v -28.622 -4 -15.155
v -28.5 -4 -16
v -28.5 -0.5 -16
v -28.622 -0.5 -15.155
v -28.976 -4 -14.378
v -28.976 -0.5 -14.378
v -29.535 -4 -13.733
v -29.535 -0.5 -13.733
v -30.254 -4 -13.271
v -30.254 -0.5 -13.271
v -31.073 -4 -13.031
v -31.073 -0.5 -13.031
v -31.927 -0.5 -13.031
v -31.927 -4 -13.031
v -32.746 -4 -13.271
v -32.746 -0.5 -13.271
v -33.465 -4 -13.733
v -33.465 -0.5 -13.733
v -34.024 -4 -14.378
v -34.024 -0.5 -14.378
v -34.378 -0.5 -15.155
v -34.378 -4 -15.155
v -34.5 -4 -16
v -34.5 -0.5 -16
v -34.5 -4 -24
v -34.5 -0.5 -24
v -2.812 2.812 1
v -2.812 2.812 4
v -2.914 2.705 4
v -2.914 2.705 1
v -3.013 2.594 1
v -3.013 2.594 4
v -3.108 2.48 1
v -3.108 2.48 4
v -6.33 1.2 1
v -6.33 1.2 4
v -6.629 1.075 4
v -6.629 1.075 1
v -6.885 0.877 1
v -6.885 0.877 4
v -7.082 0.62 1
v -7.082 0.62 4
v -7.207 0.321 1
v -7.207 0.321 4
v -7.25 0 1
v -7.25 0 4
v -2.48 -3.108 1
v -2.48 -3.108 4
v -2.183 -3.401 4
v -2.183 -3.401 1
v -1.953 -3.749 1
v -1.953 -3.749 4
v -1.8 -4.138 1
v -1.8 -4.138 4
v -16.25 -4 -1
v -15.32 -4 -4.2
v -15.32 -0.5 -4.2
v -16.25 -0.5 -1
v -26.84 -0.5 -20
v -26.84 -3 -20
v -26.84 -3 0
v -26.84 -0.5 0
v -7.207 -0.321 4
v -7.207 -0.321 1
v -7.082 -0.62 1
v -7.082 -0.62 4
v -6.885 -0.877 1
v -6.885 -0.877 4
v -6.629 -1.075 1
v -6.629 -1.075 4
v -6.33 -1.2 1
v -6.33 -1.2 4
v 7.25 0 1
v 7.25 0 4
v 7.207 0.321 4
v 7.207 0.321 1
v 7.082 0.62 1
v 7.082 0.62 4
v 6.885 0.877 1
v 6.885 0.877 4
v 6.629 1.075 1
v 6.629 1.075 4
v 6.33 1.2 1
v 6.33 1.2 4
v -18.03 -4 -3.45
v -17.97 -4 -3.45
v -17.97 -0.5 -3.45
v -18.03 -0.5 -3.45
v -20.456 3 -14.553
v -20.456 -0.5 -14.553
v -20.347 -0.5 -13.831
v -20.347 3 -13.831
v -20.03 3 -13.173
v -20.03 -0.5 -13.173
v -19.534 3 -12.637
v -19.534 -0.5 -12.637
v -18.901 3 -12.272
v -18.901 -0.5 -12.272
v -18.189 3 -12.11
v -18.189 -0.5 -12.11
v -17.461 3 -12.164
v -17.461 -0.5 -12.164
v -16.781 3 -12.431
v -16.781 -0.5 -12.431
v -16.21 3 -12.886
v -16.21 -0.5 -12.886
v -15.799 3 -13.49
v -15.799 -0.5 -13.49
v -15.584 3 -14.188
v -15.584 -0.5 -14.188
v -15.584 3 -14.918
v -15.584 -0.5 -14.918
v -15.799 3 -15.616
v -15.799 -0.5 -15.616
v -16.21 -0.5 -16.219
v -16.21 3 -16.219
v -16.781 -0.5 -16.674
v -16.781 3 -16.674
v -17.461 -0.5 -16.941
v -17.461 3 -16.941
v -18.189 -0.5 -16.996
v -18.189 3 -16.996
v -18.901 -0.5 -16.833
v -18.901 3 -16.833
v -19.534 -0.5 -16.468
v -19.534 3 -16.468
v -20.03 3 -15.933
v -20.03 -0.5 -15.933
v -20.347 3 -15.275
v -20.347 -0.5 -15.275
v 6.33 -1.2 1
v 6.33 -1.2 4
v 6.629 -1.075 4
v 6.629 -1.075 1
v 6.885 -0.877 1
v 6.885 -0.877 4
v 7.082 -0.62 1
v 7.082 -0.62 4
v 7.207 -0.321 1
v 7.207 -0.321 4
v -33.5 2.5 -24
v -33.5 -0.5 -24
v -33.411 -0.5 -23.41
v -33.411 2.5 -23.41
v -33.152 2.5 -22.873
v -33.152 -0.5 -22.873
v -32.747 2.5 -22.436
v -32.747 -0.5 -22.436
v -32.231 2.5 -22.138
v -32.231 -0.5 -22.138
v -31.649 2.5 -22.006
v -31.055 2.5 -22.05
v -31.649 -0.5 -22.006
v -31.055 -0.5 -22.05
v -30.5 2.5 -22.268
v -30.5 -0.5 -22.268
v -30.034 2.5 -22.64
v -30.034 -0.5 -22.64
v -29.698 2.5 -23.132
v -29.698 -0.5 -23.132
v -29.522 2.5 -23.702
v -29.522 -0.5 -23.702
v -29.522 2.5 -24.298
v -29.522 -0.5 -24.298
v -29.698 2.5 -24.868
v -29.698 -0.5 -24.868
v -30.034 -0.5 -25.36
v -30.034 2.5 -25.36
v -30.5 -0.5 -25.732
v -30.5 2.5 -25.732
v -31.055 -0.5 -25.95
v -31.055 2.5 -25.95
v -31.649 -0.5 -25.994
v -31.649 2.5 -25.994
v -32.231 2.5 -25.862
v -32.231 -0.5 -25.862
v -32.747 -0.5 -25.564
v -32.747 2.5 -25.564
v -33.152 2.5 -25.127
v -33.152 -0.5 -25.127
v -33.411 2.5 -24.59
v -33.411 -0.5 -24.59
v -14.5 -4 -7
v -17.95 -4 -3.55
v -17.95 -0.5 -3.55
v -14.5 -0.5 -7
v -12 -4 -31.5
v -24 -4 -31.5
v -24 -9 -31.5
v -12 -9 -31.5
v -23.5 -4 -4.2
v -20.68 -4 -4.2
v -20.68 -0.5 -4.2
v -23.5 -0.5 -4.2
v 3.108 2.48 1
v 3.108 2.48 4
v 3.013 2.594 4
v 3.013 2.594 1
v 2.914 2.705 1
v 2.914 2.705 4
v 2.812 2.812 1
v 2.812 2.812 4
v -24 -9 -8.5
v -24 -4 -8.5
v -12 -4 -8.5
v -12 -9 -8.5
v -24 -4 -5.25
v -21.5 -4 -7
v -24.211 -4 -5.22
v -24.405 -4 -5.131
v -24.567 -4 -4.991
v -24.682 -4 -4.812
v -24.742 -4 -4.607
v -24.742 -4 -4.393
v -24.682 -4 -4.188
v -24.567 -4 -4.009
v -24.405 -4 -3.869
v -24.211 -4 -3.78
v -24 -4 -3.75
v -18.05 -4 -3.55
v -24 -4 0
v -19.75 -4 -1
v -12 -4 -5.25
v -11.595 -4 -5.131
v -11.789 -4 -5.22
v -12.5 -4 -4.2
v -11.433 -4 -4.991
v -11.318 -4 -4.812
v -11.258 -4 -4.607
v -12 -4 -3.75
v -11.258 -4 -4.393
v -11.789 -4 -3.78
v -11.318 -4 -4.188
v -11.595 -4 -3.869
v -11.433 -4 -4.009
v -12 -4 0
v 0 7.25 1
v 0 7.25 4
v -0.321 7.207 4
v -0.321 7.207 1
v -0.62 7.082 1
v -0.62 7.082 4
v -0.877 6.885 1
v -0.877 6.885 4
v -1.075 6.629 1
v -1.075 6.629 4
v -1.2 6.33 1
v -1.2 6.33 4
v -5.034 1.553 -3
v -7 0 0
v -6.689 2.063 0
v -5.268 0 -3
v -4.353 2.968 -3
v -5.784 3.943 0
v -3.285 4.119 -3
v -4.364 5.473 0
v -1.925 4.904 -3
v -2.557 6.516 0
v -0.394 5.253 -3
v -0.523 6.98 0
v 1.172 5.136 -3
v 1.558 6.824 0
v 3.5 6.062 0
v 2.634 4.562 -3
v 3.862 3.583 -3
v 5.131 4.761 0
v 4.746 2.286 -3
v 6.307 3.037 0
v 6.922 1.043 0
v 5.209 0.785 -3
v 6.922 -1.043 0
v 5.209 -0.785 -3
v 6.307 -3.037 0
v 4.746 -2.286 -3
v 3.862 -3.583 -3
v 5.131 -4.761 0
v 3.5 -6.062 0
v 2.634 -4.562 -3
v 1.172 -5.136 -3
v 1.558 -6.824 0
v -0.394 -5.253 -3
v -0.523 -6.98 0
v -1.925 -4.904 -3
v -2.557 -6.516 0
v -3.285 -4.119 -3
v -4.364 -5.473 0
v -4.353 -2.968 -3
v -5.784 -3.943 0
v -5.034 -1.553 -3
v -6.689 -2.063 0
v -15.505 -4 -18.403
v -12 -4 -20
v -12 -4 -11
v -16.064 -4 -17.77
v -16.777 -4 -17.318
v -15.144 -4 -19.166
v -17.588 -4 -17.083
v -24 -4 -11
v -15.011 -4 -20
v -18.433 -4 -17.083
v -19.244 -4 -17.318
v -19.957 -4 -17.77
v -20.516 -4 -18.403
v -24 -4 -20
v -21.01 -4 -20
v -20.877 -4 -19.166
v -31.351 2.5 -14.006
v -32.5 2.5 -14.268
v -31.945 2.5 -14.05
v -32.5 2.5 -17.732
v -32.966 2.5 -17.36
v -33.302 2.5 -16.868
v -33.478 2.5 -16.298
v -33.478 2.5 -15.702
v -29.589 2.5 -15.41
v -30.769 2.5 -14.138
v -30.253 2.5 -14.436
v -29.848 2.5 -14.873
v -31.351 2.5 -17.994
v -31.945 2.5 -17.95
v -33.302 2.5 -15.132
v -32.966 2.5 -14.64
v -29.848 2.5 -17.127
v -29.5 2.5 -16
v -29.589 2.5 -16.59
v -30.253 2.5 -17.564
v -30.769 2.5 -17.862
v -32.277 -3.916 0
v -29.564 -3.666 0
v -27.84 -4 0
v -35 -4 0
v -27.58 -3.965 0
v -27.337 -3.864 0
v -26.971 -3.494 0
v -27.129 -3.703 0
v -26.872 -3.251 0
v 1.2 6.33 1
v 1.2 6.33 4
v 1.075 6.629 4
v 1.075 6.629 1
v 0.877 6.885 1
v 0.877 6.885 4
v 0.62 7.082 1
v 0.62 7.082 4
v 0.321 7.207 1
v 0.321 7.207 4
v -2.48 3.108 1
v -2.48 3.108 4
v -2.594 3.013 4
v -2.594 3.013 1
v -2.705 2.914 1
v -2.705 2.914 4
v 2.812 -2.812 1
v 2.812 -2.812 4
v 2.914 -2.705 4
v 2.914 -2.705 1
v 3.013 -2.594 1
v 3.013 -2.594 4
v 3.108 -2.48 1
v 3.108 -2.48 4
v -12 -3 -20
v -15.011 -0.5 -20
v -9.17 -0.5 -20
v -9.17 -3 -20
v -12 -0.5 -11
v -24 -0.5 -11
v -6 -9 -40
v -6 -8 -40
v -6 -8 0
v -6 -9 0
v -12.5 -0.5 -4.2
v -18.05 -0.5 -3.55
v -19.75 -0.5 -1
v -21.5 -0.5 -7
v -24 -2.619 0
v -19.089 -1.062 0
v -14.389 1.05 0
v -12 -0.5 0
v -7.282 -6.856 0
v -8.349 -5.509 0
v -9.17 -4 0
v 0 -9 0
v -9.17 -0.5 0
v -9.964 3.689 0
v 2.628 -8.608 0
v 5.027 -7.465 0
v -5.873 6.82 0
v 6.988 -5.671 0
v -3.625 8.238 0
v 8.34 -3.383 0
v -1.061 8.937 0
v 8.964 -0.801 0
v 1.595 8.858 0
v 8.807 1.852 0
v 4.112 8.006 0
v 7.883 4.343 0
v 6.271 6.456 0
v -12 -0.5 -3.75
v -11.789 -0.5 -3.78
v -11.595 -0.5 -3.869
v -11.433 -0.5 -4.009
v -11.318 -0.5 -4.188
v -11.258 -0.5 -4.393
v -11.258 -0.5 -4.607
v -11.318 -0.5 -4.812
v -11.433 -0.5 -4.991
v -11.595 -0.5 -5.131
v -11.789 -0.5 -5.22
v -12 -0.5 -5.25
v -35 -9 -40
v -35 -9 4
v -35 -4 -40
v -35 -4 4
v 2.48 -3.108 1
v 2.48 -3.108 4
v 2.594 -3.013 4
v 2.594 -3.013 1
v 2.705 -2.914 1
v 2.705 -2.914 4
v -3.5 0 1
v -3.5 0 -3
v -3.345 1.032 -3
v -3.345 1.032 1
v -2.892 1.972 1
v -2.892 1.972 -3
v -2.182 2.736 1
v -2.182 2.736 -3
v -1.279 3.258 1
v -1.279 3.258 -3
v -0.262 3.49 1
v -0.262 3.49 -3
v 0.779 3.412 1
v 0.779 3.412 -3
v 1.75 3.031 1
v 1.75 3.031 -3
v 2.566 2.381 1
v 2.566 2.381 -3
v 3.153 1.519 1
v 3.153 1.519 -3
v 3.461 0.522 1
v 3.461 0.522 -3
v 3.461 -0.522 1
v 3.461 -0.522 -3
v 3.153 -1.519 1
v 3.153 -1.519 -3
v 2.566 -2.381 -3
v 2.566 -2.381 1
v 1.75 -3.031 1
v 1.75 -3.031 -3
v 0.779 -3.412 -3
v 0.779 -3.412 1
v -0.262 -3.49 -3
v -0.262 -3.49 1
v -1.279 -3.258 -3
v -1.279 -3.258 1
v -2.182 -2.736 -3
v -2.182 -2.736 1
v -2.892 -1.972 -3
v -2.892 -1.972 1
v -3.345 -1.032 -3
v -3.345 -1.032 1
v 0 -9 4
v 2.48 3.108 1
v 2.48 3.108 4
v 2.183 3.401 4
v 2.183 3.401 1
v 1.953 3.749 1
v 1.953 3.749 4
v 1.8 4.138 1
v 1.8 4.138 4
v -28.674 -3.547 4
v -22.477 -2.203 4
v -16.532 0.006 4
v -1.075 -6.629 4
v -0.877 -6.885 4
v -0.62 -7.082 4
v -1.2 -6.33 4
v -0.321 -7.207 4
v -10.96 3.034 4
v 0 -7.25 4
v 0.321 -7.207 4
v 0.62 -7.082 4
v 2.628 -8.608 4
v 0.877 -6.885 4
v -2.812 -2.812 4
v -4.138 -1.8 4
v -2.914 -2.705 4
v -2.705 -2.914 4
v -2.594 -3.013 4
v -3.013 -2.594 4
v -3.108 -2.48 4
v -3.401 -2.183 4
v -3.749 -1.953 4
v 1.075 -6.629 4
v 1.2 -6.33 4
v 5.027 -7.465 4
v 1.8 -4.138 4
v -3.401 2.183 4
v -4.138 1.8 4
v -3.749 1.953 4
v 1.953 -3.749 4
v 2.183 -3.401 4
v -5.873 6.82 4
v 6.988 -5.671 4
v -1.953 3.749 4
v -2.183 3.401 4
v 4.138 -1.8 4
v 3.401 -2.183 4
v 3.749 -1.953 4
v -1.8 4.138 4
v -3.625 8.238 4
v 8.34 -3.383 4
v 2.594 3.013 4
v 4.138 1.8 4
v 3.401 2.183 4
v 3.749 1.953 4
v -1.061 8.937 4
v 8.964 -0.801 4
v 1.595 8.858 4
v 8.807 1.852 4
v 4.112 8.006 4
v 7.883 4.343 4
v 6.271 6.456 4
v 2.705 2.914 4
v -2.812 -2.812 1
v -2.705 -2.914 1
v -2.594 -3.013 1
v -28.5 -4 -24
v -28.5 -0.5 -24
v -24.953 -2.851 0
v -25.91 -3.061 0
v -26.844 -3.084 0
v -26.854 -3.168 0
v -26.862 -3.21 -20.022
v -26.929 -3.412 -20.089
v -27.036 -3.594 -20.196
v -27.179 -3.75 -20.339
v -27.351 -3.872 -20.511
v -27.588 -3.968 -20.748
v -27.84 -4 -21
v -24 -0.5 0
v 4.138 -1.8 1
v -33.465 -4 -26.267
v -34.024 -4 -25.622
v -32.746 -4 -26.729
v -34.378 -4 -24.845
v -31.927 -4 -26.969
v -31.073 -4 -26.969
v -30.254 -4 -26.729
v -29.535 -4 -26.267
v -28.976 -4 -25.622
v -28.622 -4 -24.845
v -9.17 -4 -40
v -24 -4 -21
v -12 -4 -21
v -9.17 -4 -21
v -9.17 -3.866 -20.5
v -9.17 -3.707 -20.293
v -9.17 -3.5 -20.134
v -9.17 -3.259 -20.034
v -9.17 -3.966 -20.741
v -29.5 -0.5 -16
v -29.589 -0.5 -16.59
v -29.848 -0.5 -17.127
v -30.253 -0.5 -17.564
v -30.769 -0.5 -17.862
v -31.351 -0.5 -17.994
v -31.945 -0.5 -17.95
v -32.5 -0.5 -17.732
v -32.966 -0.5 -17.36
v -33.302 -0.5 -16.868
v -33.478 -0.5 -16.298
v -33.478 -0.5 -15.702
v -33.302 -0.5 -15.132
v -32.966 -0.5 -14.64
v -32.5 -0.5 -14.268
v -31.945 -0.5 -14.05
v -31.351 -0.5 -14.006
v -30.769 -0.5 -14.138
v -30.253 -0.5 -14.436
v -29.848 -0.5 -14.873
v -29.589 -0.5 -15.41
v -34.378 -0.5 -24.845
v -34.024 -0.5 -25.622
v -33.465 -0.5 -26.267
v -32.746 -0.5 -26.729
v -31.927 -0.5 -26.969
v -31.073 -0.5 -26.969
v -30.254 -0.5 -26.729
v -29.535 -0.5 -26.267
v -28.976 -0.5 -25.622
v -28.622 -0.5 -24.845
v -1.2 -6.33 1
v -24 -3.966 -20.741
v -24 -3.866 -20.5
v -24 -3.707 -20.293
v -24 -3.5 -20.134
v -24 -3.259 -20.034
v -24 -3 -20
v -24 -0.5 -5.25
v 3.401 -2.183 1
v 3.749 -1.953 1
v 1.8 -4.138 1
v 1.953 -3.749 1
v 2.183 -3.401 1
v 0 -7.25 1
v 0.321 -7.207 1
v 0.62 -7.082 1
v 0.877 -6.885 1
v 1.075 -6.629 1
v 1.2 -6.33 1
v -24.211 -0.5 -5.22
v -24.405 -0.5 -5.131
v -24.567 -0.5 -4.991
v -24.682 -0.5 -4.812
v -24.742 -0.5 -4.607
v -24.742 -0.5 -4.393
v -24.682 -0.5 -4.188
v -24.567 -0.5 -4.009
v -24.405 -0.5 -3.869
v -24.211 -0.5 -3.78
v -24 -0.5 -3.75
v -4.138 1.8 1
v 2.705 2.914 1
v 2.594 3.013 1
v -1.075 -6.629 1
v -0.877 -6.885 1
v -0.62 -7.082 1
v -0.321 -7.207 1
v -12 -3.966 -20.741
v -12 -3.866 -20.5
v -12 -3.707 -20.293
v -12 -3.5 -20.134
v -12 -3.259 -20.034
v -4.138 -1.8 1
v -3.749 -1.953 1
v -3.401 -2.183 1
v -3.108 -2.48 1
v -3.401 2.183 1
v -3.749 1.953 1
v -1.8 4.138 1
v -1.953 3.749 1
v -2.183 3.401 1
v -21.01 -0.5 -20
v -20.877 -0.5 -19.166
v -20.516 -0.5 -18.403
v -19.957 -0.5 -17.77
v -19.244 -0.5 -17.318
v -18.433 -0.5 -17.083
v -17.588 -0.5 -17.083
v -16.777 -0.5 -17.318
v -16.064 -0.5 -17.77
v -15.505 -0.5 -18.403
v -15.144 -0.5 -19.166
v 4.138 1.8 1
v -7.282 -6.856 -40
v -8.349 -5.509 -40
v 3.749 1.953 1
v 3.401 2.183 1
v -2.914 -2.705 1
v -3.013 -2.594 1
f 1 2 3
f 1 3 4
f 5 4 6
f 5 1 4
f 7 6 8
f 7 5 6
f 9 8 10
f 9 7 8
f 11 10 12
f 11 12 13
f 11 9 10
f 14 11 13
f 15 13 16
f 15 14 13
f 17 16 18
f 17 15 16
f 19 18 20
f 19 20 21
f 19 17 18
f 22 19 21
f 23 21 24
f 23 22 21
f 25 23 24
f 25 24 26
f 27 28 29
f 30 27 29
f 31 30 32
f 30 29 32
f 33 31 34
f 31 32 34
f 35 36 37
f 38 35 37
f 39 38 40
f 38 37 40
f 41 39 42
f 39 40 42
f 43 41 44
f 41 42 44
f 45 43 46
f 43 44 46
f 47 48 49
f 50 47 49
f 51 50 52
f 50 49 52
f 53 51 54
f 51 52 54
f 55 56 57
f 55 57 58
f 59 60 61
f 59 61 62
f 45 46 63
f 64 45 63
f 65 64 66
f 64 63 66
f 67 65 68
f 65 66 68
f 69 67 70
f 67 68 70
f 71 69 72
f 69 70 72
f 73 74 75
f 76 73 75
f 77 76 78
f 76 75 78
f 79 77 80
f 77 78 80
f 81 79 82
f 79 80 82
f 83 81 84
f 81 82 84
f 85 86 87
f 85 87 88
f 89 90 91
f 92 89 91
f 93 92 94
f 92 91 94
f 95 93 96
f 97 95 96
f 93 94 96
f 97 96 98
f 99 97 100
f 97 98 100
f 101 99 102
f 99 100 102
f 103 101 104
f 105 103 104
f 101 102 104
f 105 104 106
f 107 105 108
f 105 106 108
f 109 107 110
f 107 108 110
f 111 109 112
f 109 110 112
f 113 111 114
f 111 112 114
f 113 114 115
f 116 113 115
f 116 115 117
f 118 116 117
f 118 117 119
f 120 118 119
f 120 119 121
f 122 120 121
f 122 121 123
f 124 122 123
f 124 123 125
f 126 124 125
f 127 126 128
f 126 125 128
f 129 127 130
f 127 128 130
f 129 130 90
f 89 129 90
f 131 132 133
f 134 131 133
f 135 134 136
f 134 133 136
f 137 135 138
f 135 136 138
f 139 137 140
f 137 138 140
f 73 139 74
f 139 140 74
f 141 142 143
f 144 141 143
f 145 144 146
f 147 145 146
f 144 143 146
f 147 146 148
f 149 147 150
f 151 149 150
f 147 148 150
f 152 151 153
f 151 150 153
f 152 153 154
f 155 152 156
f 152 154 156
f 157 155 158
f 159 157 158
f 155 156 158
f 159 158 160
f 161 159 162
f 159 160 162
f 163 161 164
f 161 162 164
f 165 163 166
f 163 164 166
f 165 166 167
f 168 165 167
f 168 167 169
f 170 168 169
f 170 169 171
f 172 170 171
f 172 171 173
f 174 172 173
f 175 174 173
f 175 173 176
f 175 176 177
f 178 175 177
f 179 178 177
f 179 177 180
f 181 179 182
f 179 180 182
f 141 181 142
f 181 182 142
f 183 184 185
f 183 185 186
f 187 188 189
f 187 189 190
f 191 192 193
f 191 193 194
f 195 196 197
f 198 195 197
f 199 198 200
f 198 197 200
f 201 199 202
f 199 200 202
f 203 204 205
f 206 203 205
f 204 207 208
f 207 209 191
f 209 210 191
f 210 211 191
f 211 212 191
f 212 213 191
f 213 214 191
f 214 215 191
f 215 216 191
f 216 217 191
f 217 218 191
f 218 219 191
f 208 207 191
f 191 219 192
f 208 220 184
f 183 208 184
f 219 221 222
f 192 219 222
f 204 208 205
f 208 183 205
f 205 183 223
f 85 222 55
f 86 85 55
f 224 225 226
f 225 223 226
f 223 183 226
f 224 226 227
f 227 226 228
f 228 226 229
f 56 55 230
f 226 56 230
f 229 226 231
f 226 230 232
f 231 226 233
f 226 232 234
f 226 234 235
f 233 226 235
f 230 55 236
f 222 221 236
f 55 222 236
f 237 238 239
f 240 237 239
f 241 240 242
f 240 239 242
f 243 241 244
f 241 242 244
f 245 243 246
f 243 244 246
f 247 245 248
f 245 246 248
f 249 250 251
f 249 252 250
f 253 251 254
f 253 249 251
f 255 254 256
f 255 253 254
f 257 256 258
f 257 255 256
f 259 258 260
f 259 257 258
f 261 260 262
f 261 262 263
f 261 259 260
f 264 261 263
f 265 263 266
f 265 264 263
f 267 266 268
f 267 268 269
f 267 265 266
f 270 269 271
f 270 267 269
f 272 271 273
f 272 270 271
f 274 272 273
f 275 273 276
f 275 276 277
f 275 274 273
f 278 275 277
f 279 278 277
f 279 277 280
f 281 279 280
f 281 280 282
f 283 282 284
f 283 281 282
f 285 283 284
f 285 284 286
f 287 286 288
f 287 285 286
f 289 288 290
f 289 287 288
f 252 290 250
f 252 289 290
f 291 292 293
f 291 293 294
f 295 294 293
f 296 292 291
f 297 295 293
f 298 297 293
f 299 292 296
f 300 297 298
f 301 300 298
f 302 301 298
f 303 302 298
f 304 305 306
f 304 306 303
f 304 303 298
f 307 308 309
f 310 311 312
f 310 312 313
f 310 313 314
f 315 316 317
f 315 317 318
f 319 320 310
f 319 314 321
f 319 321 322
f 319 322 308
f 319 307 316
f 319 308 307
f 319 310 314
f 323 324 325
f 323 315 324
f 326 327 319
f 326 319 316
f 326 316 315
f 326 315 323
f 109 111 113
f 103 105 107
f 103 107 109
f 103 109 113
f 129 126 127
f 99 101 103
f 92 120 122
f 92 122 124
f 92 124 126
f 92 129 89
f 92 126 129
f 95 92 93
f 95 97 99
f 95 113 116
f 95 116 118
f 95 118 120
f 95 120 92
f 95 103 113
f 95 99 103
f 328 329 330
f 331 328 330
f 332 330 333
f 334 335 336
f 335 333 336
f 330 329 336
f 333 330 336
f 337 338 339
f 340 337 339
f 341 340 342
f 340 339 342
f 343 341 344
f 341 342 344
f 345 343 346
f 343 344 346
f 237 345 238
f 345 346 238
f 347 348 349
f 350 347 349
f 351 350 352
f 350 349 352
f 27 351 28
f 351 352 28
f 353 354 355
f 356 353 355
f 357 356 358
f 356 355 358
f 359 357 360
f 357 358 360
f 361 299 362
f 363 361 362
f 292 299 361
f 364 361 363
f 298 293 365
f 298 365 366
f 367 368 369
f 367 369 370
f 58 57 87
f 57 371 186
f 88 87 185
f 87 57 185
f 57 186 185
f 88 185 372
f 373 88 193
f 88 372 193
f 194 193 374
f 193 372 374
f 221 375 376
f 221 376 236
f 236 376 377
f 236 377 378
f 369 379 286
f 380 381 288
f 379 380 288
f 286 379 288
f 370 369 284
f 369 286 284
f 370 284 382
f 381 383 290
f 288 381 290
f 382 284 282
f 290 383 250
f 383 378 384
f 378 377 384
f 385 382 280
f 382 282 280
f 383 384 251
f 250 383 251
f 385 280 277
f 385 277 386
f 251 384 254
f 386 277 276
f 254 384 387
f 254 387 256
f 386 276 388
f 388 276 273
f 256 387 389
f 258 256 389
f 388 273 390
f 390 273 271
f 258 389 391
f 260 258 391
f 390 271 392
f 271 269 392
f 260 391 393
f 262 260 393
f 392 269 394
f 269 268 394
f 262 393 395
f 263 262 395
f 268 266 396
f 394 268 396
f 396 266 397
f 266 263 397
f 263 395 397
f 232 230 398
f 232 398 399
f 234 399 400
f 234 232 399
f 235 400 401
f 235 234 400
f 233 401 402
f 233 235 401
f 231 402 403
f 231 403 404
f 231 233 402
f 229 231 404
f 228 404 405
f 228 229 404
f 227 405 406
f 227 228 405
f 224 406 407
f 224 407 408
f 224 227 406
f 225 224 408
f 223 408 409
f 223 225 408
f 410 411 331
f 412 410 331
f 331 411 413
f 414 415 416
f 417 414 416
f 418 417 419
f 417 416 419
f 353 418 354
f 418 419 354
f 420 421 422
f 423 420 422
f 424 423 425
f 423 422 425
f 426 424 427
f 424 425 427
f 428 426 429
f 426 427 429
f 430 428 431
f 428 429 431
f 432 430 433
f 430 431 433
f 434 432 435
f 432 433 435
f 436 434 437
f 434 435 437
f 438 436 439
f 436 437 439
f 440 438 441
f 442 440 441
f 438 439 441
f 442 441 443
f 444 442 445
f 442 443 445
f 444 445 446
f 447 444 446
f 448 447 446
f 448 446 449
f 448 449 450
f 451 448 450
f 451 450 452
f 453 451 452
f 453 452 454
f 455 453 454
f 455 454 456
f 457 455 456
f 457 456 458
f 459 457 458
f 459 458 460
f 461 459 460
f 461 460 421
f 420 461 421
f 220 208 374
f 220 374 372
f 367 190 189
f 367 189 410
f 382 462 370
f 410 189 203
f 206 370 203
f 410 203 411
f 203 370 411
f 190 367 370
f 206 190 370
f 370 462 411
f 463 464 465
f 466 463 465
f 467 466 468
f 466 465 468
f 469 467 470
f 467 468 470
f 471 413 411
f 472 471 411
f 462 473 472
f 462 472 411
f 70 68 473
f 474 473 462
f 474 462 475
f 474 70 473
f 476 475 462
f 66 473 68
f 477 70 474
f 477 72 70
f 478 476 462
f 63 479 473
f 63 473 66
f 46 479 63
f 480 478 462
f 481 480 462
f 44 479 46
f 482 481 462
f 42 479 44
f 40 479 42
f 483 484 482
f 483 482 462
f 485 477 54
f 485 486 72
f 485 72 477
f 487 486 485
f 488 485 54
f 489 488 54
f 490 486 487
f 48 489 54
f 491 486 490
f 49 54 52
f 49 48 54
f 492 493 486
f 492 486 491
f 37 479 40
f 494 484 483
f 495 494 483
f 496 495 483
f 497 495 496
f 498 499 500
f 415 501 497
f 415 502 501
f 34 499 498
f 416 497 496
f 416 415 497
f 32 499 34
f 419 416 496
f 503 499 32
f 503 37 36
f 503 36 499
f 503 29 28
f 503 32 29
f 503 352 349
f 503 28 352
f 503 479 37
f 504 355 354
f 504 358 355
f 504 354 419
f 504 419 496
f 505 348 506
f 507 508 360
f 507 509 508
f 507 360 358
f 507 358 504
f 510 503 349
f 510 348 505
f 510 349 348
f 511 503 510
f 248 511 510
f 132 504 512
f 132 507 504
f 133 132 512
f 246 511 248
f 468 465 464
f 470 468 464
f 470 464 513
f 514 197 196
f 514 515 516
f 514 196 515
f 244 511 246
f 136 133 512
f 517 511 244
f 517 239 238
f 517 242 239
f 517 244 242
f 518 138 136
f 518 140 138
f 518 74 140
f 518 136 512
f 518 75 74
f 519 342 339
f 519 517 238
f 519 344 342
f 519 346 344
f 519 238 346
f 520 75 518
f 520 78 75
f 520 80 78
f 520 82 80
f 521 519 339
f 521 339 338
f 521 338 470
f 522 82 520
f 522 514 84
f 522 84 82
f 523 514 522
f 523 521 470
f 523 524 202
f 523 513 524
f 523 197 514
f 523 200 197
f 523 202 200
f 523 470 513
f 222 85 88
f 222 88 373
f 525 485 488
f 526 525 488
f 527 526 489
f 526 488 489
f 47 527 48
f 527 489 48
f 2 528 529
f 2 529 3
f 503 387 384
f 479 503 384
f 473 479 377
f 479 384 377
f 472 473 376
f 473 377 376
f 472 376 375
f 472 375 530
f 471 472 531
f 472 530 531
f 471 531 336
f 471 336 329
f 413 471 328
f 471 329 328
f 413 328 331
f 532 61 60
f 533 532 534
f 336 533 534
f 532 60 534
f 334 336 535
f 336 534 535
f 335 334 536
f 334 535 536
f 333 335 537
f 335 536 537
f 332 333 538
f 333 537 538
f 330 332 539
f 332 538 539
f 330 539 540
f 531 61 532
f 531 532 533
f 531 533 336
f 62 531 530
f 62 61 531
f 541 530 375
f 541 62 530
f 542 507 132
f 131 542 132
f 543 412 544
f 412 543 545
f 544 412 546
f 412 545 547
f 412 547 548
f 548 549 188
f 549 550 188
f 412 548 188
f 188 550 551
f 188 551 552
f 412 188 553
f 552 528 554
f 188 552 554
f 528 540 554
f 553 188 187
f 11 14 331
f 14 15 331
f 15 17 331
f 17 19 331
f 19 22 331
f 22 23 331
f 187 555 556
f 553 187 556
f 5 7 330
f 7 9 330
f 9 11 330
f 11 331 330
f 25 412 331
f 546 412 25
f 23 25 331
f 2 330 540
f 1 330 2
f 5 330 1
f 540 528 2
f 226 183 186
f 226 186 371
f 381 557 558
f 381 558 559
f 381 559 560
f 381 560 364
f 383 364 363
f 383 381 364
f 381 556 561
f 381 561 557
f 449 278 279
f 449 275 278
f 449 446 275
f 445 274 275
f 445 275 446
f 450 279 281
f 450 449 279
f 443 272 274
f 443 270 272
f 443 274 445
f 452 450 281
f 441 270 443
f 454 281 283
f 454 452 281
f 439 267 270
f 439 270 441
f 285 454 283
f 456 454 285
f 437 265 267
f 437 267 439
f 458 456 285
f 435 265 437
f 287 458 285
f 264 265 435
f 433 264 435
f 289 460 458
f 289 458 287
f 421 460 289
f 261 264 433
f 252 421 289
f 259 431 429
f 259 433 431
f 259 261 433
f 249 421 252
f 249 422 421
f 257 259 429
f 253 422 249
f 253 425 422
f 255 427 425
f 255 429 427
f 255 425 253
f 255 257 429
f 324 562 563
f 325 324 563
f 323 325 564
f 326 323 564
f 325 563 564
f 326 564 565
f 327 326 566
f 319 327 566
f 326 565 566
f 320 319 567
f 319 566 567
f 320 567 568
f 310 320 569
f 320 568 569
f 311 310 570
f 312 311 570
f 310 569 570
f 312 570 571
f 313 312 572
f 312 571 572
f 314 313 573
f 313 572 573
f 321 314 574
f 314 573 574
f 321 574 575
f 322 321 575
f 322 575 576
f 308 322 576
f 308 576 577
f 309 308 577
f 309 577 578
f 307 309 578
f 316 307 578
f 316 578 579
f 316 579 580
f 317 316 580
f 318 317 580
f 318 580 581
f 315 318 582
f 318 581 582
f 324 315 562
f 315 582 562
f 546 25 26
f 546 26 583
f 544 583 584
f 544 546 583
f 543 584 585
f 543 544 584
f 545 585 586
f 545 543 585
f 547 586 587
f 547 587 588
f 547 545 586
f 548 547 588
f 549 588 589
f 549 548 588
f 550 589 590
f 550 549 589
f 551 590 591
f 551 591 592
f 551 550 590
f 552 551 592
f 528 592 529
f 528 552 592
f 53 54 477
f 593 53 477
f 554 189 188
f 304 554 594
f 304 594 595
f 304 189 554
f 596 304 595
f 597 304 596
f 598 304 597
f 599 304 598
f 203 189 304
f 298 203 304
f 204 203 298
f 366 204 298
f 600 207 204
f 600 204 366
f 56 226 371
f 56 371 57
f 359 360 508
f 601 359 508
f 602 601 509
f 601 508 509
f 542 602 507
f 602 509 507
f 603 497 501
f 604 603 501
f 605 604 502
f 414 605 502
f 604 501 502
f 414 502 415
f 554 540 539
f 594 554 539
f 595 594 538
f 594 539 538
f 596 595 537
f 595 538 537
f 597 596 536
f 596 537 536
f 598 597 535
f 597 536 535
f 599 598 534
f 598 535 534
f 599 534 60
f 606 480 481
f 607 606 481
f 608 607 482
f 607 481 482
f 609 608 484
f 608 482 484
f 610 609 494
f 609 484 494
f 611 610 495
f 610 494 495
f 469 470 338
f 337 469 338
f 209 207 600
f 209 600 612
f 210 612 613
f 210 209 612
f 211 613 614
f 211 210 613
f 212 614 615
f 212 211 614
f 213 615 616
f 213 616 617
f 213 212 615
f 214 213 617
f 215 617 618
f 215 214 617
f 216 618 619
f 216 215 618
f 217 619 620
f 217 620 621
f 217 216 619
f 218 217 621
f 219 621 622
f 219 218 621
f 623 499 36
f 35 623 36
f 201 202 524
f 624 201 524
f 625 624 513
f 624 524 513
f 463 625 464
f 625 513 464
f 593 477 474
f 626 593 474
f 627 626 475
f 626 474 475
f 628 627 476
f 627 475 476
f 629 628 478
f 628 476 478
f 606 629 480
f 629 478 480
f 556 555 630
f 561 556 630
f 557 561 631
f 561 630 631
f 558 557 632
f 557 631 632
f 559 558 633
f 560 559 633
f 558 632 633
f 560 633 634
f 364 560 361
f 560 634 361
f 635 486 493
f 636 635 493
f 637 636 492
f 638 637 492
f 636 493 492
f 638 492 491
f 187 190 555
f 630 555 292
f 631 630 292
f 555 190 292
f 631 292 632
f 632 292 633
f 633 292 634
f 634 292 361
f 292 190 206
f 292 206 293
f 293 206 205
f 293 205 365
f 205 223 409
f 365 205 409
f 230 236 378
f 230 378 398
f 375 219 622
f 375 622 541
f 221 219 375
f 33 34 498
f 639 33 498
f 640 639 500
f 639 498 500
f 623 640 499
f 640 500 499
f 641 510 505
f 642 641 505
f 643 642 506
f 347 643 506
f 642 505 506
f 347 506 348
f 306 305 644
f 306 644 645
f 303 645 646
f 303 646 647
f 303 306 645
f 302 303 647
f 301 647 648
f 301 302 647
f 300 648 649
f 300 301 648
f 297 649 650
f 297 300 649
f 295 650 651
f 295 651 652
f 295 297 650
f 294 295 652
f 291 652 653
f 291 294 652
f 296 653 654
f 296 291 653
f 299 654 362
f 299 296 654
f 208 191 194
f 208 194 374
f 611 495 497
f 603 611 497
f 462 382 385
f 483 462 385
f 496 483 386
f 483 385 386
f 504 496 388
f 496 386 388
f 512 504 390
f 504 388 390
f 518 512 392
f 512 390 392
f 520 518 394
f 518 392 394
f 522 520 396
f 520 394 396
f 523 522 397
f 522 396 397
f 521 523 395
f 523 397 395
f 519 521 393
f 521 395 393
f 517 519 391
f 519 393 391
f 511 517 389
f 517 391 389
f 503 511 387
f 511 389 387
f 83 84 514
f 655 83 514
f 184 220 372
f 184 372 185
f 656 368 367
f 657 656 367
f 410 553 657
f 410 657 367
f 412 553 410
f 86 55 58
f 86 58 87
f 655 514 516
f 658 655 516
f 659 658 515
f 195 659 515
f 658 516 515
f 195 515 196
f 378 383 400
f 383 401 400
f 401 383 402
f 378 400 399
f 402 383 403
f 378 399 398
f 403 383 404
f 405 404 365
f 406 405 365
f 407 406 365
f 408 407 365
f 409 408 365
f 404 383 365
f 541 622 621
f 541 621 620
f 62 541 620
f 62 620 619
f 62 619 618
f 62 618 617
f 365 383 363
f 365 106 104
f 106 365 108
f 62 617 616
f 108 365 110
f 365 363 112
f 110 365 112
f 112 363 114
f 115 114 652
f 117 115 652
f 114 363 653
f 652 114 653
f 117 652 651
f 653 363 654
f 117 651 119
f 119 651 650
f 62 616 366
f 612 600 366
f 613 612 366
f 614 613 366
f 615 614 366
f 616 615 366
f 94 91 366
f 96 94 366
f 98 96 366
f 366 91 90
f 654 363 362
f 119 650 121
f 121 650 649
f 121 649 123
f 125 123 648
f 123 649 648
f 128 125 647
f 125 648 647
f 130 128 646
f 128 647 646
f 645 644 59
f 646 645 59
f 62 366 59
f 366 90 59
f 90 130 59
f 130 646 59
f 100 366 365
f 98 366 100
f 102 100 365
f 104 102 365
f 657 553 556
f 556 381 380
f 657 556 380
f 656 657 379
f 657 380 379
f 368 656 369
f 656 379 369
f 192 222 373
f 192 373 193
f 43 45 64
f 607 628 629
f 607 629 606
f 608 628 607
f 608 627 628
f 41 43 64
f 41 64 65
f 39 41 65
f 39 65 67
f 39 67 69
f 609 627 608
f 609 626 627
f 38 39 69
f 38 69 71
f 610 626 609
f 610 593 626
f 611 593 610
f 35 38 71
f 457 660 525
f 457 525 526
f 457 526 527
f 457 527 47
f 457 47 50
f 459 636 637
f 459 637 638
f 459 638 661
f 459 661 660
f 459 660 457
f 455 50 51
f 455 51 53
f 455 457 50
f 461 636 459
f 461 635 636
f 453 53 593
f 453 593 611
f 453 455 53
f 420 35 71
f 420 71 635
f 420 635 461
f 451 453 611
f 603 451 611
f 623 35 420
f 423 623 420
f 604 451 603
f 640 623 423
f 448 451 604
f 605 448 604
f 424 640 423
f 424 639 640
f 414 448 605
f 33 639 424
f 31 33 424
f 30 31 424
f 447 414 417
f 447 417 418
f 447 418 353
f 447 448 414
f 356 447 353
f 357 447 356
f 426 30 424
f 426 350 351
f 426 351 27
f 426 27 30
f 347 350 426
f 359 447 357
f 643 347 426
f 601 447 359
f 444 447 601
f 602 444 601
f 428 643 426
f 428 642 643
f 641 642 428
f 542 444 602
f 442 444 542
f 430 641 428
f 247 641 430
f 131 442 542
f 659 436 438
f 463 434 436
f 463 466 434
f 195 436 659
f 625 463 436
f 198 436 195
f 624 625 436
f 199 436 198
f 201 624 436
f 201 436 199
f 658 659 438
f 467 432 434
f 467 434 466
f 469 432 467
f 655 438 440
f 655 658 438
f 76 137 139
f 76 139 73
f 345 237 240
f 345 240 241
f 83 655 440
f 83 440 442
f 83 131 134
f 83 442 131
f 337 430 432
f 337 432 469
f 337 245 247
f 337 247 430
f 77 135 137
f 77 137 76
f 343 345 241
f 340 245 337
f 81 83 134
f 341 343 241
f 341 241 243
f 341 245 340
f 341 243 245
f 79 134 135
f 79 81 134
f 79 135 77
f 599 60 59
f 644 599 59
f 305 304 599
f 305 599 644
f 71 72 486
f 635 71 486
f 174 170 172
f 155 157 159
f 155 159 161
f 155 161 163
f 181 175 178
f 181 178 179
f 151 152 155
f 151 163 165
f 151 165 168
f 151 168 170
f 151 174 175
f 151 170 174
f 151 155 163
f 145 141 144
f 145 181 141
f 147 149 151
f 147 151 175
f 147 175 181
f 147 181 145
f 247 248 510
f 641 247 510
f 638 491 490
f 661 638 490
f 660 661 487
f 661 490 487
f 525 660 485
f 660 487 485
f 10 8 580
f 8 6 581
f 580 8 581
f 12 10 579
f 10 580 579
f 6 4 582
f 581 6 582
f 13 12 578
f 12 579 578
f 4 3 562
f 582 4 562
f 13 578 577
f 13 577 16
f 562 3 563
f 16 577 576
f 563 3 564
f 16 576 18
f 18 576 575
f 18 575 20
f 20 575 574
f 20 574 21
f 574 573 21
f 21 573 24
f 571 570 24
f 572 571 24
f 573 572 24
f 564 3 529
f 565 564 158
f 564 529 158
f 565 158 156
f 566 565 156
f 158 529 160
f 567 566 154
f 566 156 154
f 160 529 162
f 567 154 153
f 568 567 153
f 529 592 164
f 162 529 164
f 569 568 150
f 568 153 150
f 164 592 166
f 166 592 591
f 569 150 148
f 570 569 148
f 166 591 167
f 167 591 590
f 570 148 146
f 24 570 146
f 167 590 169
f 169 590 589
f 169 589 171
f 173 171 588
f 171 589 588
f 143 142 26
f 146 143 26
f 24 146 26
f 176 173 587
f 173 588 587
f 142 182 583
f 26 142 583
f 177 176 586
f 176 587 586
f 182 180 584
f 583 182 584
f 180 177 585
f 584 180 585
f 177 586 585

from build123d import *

# Parameters (mm, degrees)
SKETCH1_R           = 9
BOSS_EXTRUDE1_DEPTH = 4
SKETCH2_R           = 7
BOSS_EXTRUDE2_DEPTH = 3
BOSS_EXTRUDE2_TAPER = 30
CUT_EXTRUDE1_DEPTH  = 3
BOSS_EXTRUDE3_DEPTH = 40
SKETCH6_W           = 12
SKETCH6_H           = 23
CUT_EXTRUDE2_DEPTH  = 55.717456081
BOSS_EXTRUDE4_DEPTH = 3.5
SKETCH8_R           = 2
BOSS_EXTRUDE5_DEPTH = 3
SKETCH9_R           = 3.5
CUT_EXTRUDE3_DEPTH  = 52.720402164
BOSS_EXTRUDE6_DEPTH = 3.5
SKETCH11_R          = 2.45
BOSS_EXTRUDE7_DEPTH = 3.5
BOSS_EXTRUDE8_DEPTH = 3.5
FILLET3_START       = -26.84
FILLET3_DEPTH       = 2.84
FILLET3_START_2     = -12
FILLET3_2_DEPTH     = 2.83
FILLET3_START_3     = -21
FILLET3_3_DEPTH     = 21
FILLET3_START_4     = -27.84
FILLET3_4_DEPTH     = 1


with BuildPart() as part:
    # Sketch1 → Boss-Extrude1 (new body)
    with BuildSketch(Plane.XY):
        with BuildLine():
            Line((-35, -9), (0, -9))
            ThreePointArc((0, -9), (-8.437416666, -3.132091953), (-5.872614409, 6.82))
            ThreePointArc((-5.872614409, 6.82), (-19.465199243, -1.204217751), (-35, -4))
            Line((-35, -4), (-35, -9))
        make_face()
        Circle(SKETCH1_R)
    extrude(amount=BOSS_EXTRUDE1_DEPTH)

    # Sketch2 → Boss-Extrude2 (add)
    with BuildSketch(Plane(origin=(0, 0, 0), x_dir=(-1, 0, 0), z_dir=(0, 0, -1))):
        Circle(SKETCH2_R)
    extrude(amount=BOSS_EXTRUDE2_DEPTH, taper=BOSS_EXTRUDE2_TAPER)

    # Sketch4 → Cut-Extrude1 (cut)
    with BuildSketch(Plane.XY.offset(4)):
        with BuildLine():
            Line((1.2, -6.33), (1.8, -4.1378116))
            ThreePointArc((1.8, -4.1378116), (2.058560194, -3.569045514), (2.48, -3.1078116))
            ThreePointArc((2.48, -3.1078116), (2.64989874, -2.964295475), (2.811558399, -2.811558399))
            ThreePointArc((2.811558399, -2.811558399), (2.964295475, -2.64989874), (3.1078116, -2.48))
            ThreePointArc((3.1078116, -2.48), (3.569045514, -2.058560194), (4.1378116, -1.8))
            Line((4.1378116, -1.8), (6.33, -1.2))
            ThreePointArc((6.33, -1.2), (6.992020752, -0.754882576), (7.25, 0))
            ThreePointArc((7.25, 0), (6.992020752, 0.754882576), (6.33, 1.2))
            Line((6.33, 1.2), (4.1378116, 1.8))
            ThreePointArc((4.1378116, 1.8), (3.569045514, 2.058560194), (3.1078116, 2.48))
            ThreePointArc((3.1078116, 2.48), (2.964295475, 2.64989874), (2.811558399, 2.811558399))
            ThreePointArc((2.811558399, 2.811558399), (2.64989874, 2.964295475), (2.48, 3.1078116))
            ThreePointArc((2.48, 3.1078116), (2.058560194, 3.569045514), (1.8, 4.1378116))
            Line((1.8, 4.1378116), (1.2, 6.33))
            ThreePointArc((1.2, 6.33), (0.754882576, 6.992020752), (0, 7.25))
            ThreePointArc((0, 7.25), (-0.754882576, 6.992020752), (-1.2, 6.33))
            Line((-1.2, 6.33), (-1.8, 4.1378116))
            ThreePointArc((-1.8, 4.1378116), (-2.058560194, 3.569045514), (-2.48, 3.1078116))
            ThreePointArc((-2.48, 3.1078116), (-2.64989874, 2.964295475), (-2.811558399, 2.811558399))
            ThreePointArc((-2.811558399, 2.811558399), (-2.964295475, 2.64989874), (-3.1078116, 2.48))
            ThreePointArc((-3.1078116, 2.48), (-3.569045514, 2.058560194), (-4.1378116, 1.8))
            Line((-4.1378116, 1.8), (-6.33, 1.2))
            ThreePointArc((-6.33, 1.2), (-6.992020752, 0.754882576), (-7.25, 0))
            ThreePointArc((-7.25, 0), (-6.992020752, -0.754882576), (-6.33, -1.2))
            Line((-6.33, -1.2), (-4.1378116, -1.8))
            ThreePointArc((-4.1378116, -1.8), (-3.569045514, -2.058560194), (-3.1078116, -2.48))
            ThreePointArc((-3.1078116, -2.48), (-2.964295475, -2.64989874), (-2.811558399, -2.811558399))
            ThreePointArc((-2.811558399, -2.811558399), (-2.64989874, -2.964295475), (-2.48, -3.1078116))
            ThreePointArc((-2.48, -3.1078116), (-2.058560194, -3.569045514), (-1.8, -4.1378116))
            Line((-1.8, -4.1378116), (-1.2, -6.33))
            ThreePointArc((-1.2, -6.33), (-0.754882576, -6.992020752), (0, -7.25))
            ThreePointArc((0, -7.25), (0.754882576, -6.992020752), (1.2, -6.33))
        make_face()
    extrude(amount=-CUT_EXTRUDE1_DEPTH, mode=Mode.SUBTRACT)

    # Sketch5 → Boss-Extrude3 (add)
    with BuildSketch(Plane(origin=(0, 0, 0), x_dir=(-1, 0, 0), z_dir=(0, 0, -1))):
        with BuildLine():
            Line((35, -9), (35, -4))
            Line((35, -4), (9.17, -4))
            ThreePointArc((9.17, -4), (7.844486312, -6.205642902), (6, -8))
            Line((6, -8), (6, -9))
            Line((6, -9), (35, -9))
        make_face()
    extrude(amount=BOSS_EXTRUDE3_DEPTH)

    # Sketch6 → Cut-Extrude2 (cut, through all)
    with BuildSketch(Plane(origin=(0, -4, 0), x_dir=(1, 0, 0), z_dir=(0, 1, 0))):
        with Locations((-18, 20)):
            Rectangle(SKETCH6_W, SKETCH6_H)
    extrude(amount=-CUT_EXTRUDE2_DEPTH, mode=Mode.SUBTRACT)

    # Sketch7 → Boss-Extrude4 (add)
    with BuildSketch(Plane(origin=(0, -4, 0), x_dir=(1, 0, 0), z_dir=(0, 1, 0))):
        with BuildLine():
            Line((-28.5, 24), (-28.5, 16))
            ThreePointArc((-28.5, 16), (-31.5, 13), (-34.5, 16))
            Line((-34.5, 16), (-34.5, 24))
            ThreePointArc((-34.5, 24), (-31.5, 27), (-28.5, 24))
        make_face()
    extrude(amount=BOSS_EXTRUDE4_DEPTH)

    # Sketch8 → Boss-Extrude5 (add)
    with BuildSketch(Plane(origin=(0, -0.5, 0), x_dir=(1, 0, 0), z_dir=(0, 1, 0))):
        with Locations(Location((-31.5, 24, 0), (0, 0, 180))):
            Circle(SKETCH8_R)
        with Locations((-31.5, 16)):
            Circle(SKETCH8_R)
    extrude(amount=BOSS_EXTRUDE5_DEPTH)

    # Sketch9 → Cut-Extrude3 (cut, through all)
    with BuildSketch(Plane(origin=(0, 0, -3), x_dir=(-1, 0, 0), z_dir=(0, 0, -1))):
        Circle(SKETCH9_R)
    extrude(amount=-CUT_EXTRUDE3_DEPTH, mode=Mode.SUBTRACT)

    # Sketch10 → Boss-Extrude6 (add)
    with BuildSketch(Plane(origin=(0, -4, 0), x_dir=(1, 0, 0), z_dir=(0, 1, 0))):
        with BuildLine():
            Line((-26.84, 0), (-26.84, 20))
            Line((-26.84, 20), (-21.01, 20))
            ThreePointArc((-21.01, 20), (-18.010462475, 17.05267484), (-15.010924951, 20))
            Line((-15.010924951, 20), (-9.17, 20))
            Line((-9.17, 20), (-9.17, 0))
            Line((-9.17, 0), (-12, 0))
            Line((-12, 0), (-12, 3.75))
            ThreePointArc((-12, 3.75), (-11.25, 4.5), (-12, 5.25))
            Line((-12, 5.25), (-12, 11))
            Line((-12, 11), (-24, 11))
            Line((-24, 11), (-24, 5.25))
            ThreePointArc((-24, 5.25), (-24.75, 4.5), (-24, 3.75))
            Line((-24, 3.75), (-24, 0))
            Line((-24, 0), (-26.84, 0))
        make_face()
    extrude(amount=BOSS_EXTRUDE6_DEPTH)

    # Sketch11 → Boss-Extrude7 (add)
    with BuildSketch(Plane(origin=(0, -0.5, 0), x_dir=(1, 0, 0), z_dir=(0, 1, 0))):
        with Locations(Location((-18.006141049, 14.55267484, 0), (0, 0, 180))):
            Circle(SKETCH11_R)
    extrude(amount=BOSS_EXTRUDE7_DEPTH)

    # Sketch12 → Boss-Extrude8 (add)
    with BuildSketch(Plane(origin=(0, -4, 0), x_dir=(1, 0, 0), z_dir=(0, 1, 0))):
        Polygon((-20.68, 4.2), (-23.5, 4.2), (-21.5, 7), (-18.05, 3.55), (-17.95, 3.55), (-14.5, 7), (-12.5, 4.2), (-15.32, 4.2), (-16.25, 1), (-17.97, 3.45), (-18.03, 3.45), (-19.75, 1), align=None)
    extrude(amount=BOSS_EXTRUDE8_DEPTH)

    # Fillet3: read off the stored shape, not the designer's step
    # Fillet3 outline → Fillet3 (add)
    with BuildSketch(Plane.YZ.offset(FILLET3_START)):
        with BuildLine():
            ThreePointArc((-4, -21), (-3.707106781, -20.292893219), (-3, -20))
            Line((-3, -20), (-4, -20))
            Line((-4, -20), (-4, -21))
        make_face()
    extrude(amount=FILLET3_DEPTH)

    # Fillet3 2 outline → Fillet3 2 (add)
    with BuildSketch(Plane.YZ.offset(FILLET3_START_2)):
        with BuildLine():
            ThreePointArc((-4, -21), (-3.707106781, -20.292893219), (-3, -20))
            Line((-3, -20), (-4, -20))
            Line((-4, -20), (-4, -21))
        make_face()
    extrude(amount=FILLET3_2_DEPTH)

    # Fillet3 3 outline → Fillet3 3 (add)
    with BuildSketch(Plane.XY.offset(FILLET3_START_3)):
        with BuildLine():
            Line((-26.84, -4), (-26.84, -3))
            ThreePointArc((-26.84, -3), (-27.132893219, -3.707106781), (-27.84, -4))
            Line((-27.84, -4), (-26.84, -4))
        make_face()
    extrude(amount=FILLET3_3_DEPTH)

    # Fillet3 4 outline → Fillet3 4 (cut)
    with BuildSketch(Plane.YZ.offset(FILLET3_START_4)):
        with BuildLine():
            Line((-2, -19.999999999), (-3, -20))
            ThreePointArc((-3, -20), (-3.707106781, -20.292893219), (-4, -21))
            Line((-4, -21), (-2, -21))
            Line((-2, -21), (-2, -19.999999999))
        make_face()
    extrude(amount=FILLET3_4_DEPTH, mode=Mode.SUBTRACT)


solid = part.part
